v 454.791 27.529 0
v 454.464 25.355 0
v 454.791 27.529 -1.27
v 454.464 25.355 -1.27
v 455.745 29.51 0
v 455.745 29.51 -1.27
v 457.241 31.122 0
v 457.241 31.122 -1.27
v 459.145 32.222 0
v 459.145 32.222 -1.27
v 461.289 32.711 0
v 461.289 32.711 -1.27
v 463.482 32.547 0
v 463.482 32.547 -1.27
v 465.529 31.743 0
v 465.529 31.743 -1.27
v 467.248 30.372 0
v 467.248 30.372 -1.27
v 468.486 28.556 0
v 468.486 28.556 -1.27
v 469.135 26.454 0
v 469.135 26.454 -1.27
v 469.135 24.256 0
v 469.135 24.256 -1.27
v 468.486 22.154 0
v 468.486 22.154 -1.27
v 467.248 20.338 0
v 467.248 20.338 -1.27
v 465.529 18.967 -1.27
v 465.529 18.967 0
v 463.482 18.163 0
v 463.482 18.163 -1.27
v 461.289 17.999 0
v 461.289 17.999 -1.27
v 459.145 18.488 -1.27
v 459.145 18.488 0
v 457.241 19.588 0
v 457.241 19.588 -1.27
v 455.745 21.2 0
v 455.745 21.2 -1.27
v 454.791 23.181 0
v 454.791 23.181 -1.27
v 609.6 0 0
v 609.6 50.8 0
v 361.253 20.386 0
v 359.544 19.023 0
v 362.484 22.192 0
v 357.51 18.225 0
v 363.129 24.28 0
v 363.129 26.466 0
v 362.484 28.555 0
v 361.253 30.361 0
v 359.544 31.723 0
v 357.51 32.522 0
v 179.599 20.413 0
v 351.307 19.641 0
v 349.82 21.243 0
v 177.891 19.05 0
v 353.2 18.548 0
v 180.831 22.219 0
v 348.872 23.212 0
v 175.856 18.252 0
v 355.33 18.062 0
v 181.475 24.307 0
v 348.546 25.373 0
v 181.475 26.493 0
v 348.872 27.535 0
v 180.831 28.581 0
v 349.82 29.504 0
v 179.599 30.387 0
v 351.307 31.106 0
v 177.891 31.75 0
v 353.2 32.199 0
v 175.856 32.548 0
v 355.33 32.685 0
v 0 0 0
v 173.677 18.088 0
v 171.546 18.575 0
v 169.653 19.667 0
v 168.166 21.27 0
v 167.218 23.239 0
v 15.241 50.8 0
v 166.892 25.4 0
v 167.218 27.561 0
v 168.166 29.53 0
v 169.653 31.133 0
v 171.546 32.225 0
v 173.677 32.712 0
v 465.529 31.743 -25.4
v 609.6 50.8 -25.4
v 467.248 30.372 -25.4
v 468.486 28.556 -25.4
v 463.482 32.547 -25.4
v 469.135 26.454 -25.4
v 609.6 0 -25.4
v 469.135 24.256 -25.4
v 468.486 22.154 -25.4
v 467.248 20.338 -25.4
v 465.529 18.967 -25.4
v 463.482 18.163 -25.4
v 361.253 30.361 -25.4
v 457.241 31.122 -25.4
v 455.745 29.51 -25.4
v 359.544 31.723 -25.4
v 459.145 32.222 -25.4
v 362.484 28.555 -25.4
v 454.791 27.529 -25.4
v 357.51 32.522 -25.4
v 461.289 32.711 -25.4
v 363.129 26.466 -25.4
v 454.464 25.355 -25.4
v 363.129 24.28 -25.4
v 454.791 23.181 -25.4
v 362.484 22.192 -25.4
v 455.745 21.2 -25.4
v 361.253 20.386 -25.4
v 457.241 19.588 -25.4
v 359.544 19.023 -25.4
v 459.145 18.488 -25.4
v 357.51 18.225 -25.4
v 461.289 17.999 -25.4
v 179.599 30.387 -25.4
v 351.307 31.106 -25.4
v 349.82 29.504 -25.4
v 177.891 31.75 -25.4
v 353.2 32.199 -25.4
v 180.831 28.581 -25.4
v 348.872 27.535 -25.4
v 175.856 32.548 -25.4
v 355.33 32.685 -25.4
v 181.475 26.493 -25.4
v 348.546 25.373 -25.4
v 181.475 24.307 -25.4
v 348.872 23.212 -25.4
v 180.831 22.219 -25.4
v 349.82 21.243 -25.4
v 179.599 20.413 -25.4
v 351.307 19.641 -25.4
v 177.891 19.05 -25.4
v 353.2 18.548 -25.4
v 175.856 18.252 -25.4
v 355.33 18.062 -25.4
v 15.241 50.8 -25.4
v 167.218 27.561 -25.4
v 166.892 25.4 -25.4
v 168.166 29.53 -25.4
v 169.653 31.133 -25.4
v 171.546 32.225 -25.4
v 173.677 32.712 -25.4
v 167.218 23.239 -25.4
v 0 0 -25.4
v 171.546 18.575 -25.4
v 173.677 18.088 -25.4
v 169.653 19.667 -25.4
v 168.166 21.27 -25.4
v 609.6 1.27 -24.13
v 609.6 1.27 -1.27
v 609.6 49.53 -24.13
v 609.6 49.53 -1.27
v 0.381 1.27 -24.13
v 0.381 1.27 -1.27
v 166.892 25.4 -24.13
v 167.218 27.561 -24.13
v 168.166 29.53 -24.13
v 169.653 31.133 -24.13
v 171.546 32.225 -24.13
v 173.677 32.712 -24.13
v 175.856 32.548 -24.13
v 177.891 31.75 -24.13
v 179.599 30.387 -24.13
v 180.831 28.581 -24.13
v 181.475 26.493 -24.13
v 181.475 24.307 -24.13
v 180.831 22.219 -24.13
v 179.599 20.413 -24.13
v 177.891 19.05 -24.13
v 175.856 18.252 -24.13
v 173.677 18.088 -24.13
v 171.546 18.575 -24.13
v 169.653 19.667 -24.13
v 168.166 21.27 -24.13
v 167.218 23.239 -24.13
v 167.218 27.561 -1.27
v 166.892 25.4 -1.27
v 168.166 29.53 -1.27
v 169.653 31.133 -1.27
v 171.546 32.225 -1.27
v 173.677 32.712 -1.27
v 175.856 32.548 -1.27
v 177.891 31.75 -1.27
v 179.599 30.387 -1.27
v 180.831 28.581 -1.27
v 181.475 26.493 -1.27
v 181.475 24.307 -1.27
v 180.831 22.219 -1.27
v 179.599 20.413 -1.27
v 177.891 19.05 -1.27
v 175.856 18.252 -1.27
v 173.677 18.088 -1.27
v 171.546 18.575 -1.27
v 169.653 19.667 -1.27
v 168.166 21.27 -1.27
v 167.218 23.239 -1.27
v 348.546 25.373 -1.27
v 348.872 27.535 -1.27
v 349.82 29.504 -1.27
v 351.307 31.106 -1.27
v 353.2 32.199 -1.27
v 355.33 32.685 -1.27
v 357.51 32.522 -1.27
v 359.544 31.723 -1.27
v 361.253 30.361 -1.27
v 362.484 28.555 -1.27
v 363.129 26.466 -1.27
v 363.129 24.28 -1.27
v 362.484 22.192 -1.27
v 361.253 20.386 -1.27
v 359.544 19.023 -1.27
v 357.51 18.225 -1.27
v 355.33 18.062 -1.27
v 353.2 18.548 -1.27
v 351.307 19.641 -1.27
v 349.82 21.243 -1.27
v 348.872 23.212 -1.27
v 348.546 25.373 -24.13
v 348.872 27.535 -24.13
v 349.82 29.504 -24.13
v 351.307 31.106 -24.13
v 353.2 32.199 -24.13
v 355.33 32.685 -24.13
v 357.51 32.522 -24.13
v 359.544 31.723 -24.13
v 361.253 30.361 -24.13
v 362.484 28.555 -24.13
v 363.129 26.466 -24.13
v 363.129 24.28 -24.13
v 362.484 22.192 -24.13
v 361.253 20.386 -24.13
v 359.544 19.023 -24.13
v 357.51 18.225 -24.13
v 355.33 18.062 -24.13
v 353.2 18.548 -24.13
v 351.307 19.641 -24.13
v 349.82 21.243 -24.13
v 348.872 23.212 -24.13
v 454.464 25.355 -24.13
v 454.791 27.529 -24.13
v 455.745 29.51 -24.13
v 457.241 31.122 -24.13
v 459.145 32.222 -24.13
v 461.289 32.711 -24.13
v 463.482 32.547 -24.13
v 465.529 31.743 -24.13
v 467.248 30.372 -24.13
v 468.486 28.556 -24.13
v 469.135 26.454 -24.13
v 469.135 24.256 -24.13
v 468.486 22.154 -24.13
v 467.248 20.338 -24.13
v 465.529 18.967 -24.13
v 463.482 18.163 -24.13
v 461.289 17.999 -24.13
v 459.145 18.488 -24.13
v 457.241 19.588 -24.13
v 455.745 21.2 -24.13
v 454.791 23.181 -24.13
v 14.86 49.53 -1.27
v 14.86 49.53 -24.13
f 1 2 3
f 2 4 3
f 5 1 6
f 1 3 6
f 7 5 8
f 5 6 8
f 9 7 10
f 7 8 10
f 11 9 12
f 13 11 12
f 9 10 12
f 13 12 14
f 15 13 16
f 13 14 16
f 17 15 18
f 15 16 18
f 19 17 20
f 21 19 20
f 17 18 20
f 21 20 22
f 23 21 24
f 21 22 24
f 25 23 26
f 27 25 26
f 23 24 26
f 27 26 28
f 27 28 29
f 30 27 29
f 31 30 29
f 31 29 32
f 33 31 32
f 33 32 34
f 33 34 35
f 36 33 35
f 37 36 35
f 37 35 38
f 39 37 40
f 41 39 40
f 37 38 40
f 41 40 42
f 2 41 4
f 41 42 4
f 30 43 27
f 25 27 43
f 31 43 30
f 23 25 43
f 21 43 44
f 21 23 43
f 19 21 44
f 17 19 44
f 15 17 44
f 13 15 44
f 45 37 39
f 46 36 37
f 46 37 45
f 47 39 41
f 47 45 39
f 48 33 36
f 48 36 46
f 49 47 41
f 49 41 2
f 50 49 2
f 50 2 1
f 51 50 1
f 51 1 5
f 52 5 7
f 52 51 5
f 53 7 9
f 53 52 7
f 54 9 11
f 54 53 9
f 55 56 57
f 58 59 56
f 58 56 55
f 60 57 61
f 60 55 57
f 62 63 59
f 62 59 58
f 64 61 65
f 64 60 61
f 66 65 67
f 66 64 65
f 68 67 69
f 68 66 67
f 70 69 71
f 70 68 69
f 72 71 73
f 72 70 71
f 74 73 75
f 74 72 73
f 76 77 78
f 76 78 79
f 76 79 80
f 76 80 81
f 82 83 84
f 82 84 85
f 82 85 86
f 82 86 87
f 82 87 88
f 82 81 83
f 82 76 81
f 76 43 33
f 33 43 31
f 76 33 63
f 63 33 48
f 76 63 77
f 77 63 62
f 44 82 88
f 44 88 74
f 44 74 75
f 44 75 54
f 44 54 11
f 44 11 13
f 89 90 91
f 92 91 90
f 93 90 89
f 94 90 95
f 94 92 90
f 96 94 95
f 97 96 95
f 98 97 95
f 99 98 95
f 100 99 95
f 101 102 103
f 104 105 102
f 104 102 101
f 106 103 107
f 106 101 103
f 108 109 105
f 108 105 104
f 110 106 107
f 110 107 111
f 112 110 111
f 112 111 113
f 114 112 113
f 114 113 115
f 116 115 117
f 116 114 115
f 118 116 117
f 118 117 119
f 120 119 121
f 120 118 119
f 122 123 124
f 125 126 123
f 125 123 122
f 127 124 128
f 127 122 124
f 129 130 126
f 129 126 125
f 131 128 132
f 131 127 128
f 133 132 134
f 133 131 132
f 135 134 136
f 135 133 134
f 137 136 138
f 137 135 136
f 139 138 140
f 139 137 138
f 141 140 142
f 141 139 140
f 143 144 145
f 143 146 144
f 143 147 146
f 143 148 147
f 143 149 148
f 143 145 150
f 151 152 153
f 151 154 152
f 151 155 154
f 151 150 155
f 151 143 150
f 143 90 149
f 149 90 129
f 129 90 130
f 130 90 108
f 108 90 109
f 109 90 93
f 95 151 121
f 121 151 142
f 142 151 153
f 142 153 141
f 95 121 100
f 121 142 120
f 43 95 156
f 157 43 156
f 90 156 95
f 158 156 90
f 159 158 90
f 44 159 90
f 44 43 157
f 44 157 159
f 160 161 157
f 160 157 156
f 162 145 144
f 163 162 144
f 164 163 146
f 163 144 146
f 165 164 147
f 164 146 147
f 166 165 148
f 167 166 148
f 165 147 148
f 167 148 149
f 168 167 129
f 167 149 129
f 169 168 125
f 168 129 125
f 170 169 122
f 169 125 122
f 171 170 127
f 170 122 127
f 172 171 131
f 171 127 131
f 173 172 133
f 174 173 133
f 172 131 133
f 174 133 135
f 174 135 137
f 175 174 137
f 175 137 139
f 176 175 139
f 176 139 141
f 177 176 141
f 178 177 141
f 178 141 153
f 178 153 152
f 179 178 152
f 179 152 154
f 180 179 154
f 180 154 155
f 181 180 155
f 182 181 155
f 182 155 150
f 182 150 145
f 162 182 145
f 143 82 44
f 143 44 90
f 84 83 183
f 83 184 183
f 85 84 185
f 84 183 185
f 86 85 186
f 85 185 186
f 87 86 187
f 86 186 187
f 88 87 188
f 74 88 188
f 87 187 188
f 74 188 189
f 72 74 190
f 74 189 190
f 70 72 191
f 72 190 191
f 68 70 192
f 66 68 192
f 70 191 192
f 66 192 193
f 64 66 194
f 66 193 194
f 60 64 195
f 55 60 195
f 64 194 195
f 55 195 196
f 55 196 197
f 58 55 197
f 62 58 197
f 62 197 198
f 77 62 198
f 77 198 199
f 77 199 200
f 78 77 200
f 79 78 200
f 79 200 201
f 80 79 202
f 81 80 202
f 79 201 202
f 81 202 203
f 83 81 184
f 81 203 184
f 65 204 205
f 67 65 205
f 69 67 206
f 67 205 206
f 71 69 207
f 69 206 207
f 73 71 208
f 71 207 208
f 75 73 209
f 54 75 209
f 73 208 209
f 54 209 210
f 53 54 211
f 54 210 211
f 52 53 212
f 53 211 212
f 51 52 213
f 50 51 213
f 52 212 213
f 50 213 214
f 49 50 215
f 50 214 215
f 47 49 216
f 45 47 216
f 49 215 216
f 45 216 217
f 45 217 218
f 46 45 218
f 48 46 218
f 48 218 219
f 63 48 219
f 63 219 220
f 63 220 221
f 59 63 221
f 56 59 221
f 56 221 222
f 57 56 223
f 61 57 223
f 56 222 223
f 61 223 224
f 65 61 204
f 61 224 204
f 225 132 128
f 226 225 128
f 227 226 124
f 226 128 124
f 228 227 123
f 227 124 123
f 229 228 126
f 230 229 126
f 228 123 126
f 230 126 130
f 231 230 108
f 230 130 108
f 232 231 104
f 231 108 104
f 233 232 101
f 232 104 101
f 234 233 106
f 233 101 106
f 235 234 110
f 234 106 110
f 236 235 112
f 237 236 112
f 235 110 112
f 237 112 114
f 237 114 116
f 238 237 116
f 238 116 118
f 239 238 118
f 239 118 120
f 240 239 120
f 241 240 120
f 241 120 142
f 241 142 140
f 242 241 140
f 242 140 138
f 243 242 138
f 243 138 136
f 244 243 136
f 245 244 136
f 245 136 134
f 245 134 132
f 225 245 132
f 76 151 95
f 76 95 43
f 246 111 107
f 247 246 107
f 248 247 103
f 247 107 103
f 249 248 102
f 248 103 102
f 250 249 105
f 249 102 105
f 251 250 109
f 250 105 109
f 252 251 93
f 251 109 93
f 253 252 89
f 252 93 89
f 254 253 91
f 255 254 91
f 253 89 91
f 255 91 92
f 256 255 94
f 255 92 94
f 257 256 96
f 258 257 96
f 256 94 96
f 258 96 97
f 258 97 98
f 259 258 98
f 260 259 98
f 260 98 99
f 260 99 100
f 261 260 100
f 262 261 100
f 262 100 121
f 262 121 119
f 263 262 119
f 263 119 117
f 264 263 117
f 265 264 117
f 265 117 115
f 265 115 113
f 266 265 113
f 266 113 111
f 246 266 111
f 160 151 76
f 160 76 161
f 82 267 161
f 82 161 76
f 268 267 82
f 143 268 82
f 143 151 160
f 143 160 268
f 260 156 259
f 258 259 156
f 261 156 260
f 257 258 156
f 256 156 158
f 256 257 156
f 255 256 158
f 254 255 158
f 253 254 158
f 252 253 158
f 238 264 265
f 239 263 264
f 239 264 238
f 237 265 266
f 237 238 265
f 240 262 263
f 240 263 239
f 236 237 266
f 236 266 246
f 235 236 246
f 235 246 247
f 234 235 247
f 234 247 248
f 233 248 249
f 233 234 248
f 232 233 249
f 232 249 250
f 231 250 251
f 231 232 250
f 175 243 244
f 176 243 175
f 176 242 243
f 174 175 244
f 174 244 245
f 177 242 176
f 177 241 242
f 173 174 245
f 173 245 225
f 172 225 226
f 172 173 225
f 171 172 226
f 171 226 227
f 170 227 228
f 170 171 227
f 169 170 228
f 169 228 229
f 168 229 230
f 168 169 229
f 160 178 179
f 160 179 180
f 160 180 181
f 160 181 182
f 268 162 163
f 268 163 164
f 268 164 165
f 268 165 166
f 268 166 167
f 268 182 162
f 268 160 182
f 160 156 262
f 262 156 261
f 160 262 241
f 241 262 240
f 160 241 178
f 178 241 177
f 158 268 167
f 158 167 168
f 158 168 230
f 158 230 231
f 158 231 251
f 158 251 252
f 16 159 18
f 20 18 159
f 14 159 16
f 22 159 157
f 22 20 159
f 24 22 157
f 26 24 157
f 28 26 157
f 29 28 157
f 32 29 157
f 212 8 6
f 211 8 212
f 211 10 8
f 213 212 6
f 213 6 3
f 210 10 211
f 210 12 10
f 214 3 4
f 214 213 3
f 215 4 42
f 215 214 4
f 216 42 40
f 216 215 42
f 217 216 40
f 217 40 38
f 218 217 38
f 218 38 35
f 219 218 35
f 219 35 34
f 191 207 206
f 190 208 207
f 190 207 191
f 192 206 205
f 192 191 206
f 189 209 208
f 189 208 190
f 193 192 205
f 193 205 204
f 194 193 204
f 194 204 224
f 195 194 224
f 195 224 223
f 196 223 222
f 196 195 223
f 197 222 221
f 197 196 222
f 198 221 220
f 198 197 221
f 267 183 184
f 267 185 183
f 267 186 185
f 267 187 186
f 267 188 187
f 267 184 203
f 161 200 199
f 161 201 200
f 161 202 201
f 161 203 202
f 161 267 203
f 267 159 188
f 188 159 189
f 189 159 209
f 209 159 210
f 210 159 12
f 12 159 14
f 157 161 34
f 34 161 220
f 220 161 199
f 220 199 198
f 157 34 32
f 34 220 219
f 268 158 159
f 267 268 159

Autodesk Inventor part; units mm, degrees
ref_plane "YZ Plane" through (0, 0, 0) normal (1, 0, 0) x (0, 1, 0)
ref_plane "XZ Plane" through (0, 0, 0) normal (0, 1, 0) x (-1, 0, 0)
ref_plane "XY Plane" through (0, 0, 0) normal (0, 0, 1) x (1, 0, 0)
sketch "Sketch1" plane through (0, 0, 0) normal (1, 0, 0) x (0, 1, 0)
  line L0 (0, 0) -> (50.8, 0)
  line L1 (50.8, 0) -> (50.8, -25.4)
  line L2 (50.8, -25.4) -> (0, -25.4)
  line L3 (0, -25.4) -> (0, 0)
  line L4 (49.53, -24.13) -> (49.53, -1.27)
  line L5 (49.53, -1.27) -> (1.27, -1.27)
  line L6 (1.27, -1.27) -> (1.27, -24.13)
  line L7 (1.27, -24.13) -> (49.53, -24.13)
  dimension "d0" = 50.8
  dimension "d1" = 25.4
  dimension "d2" = 1.27
extrude "Extrusion1" add sketch "Sketch1" along normal blind 609.6
sketch "Sketch2" plane through (0, 0, -25.4) normal (0, 0, -1) x (-1, 0, 0)
  circle A0 centre (-174.2245, 25.4) radius 7.3323
  circle A1 centre (-355.8783, 25.3733) radius 7.3323
  line L0 (-461.8402, 31.7005) -> (-458.3441, 31.8328) projected
  arc A2 (-458.0874, 31.6973) -> (-458.3441, 31.8328) centre (-461.6, 25.355) ccw projected
  arc A3 (-454.3512, 25.4841) -> (-454.3621, 25.7742) centre (-461.6, 25.355) ccw projected
  arc A4 (-457.8637, 19.1419) -> (-457.618, 19.2964) centre (-461.6, 25.355) ccw projected
  arc A5 (-465.3363, 31.5681) -> (-465.582, 31.4136) centre (-461.6, 25.355) ccw projected
  arc A6 (-468.8488, 25.2259) -> (-468.8379, 24.9358) centre (-461.6, 25.355) ccw projected
  arc A7 (-465.1126, 19.0127) -> (-464.8559, 18.8772) centre (-461.6, 25.355) ccw projected
  arc A8 (-457.8637, 19.1419) -> (-457.618, 19.2964) centre (-461.6, 25.355) ccw projected
  circle A9 centre (-461.8402, 25.355) radius 7.3767
  line L1 (0, 0) -> (-15.2407, 50.8)
  line L2 (0, 50.8) -> (-609.6, 50.8) projected
  line L3 (0, 0) -> (53.037, 0) construction
  line L4 (0, 0) -> (0, 50.8)
  line L5 (-15.2407, 50.8) -> (0, 50.8)
  dimension "d7" = 14.6647
  dimension "d9" = 106.7
extrude "Extrusion2" cut sketch "Sketch2" against normal through all
properties part number "Aluminum Channel Arm Cut"
